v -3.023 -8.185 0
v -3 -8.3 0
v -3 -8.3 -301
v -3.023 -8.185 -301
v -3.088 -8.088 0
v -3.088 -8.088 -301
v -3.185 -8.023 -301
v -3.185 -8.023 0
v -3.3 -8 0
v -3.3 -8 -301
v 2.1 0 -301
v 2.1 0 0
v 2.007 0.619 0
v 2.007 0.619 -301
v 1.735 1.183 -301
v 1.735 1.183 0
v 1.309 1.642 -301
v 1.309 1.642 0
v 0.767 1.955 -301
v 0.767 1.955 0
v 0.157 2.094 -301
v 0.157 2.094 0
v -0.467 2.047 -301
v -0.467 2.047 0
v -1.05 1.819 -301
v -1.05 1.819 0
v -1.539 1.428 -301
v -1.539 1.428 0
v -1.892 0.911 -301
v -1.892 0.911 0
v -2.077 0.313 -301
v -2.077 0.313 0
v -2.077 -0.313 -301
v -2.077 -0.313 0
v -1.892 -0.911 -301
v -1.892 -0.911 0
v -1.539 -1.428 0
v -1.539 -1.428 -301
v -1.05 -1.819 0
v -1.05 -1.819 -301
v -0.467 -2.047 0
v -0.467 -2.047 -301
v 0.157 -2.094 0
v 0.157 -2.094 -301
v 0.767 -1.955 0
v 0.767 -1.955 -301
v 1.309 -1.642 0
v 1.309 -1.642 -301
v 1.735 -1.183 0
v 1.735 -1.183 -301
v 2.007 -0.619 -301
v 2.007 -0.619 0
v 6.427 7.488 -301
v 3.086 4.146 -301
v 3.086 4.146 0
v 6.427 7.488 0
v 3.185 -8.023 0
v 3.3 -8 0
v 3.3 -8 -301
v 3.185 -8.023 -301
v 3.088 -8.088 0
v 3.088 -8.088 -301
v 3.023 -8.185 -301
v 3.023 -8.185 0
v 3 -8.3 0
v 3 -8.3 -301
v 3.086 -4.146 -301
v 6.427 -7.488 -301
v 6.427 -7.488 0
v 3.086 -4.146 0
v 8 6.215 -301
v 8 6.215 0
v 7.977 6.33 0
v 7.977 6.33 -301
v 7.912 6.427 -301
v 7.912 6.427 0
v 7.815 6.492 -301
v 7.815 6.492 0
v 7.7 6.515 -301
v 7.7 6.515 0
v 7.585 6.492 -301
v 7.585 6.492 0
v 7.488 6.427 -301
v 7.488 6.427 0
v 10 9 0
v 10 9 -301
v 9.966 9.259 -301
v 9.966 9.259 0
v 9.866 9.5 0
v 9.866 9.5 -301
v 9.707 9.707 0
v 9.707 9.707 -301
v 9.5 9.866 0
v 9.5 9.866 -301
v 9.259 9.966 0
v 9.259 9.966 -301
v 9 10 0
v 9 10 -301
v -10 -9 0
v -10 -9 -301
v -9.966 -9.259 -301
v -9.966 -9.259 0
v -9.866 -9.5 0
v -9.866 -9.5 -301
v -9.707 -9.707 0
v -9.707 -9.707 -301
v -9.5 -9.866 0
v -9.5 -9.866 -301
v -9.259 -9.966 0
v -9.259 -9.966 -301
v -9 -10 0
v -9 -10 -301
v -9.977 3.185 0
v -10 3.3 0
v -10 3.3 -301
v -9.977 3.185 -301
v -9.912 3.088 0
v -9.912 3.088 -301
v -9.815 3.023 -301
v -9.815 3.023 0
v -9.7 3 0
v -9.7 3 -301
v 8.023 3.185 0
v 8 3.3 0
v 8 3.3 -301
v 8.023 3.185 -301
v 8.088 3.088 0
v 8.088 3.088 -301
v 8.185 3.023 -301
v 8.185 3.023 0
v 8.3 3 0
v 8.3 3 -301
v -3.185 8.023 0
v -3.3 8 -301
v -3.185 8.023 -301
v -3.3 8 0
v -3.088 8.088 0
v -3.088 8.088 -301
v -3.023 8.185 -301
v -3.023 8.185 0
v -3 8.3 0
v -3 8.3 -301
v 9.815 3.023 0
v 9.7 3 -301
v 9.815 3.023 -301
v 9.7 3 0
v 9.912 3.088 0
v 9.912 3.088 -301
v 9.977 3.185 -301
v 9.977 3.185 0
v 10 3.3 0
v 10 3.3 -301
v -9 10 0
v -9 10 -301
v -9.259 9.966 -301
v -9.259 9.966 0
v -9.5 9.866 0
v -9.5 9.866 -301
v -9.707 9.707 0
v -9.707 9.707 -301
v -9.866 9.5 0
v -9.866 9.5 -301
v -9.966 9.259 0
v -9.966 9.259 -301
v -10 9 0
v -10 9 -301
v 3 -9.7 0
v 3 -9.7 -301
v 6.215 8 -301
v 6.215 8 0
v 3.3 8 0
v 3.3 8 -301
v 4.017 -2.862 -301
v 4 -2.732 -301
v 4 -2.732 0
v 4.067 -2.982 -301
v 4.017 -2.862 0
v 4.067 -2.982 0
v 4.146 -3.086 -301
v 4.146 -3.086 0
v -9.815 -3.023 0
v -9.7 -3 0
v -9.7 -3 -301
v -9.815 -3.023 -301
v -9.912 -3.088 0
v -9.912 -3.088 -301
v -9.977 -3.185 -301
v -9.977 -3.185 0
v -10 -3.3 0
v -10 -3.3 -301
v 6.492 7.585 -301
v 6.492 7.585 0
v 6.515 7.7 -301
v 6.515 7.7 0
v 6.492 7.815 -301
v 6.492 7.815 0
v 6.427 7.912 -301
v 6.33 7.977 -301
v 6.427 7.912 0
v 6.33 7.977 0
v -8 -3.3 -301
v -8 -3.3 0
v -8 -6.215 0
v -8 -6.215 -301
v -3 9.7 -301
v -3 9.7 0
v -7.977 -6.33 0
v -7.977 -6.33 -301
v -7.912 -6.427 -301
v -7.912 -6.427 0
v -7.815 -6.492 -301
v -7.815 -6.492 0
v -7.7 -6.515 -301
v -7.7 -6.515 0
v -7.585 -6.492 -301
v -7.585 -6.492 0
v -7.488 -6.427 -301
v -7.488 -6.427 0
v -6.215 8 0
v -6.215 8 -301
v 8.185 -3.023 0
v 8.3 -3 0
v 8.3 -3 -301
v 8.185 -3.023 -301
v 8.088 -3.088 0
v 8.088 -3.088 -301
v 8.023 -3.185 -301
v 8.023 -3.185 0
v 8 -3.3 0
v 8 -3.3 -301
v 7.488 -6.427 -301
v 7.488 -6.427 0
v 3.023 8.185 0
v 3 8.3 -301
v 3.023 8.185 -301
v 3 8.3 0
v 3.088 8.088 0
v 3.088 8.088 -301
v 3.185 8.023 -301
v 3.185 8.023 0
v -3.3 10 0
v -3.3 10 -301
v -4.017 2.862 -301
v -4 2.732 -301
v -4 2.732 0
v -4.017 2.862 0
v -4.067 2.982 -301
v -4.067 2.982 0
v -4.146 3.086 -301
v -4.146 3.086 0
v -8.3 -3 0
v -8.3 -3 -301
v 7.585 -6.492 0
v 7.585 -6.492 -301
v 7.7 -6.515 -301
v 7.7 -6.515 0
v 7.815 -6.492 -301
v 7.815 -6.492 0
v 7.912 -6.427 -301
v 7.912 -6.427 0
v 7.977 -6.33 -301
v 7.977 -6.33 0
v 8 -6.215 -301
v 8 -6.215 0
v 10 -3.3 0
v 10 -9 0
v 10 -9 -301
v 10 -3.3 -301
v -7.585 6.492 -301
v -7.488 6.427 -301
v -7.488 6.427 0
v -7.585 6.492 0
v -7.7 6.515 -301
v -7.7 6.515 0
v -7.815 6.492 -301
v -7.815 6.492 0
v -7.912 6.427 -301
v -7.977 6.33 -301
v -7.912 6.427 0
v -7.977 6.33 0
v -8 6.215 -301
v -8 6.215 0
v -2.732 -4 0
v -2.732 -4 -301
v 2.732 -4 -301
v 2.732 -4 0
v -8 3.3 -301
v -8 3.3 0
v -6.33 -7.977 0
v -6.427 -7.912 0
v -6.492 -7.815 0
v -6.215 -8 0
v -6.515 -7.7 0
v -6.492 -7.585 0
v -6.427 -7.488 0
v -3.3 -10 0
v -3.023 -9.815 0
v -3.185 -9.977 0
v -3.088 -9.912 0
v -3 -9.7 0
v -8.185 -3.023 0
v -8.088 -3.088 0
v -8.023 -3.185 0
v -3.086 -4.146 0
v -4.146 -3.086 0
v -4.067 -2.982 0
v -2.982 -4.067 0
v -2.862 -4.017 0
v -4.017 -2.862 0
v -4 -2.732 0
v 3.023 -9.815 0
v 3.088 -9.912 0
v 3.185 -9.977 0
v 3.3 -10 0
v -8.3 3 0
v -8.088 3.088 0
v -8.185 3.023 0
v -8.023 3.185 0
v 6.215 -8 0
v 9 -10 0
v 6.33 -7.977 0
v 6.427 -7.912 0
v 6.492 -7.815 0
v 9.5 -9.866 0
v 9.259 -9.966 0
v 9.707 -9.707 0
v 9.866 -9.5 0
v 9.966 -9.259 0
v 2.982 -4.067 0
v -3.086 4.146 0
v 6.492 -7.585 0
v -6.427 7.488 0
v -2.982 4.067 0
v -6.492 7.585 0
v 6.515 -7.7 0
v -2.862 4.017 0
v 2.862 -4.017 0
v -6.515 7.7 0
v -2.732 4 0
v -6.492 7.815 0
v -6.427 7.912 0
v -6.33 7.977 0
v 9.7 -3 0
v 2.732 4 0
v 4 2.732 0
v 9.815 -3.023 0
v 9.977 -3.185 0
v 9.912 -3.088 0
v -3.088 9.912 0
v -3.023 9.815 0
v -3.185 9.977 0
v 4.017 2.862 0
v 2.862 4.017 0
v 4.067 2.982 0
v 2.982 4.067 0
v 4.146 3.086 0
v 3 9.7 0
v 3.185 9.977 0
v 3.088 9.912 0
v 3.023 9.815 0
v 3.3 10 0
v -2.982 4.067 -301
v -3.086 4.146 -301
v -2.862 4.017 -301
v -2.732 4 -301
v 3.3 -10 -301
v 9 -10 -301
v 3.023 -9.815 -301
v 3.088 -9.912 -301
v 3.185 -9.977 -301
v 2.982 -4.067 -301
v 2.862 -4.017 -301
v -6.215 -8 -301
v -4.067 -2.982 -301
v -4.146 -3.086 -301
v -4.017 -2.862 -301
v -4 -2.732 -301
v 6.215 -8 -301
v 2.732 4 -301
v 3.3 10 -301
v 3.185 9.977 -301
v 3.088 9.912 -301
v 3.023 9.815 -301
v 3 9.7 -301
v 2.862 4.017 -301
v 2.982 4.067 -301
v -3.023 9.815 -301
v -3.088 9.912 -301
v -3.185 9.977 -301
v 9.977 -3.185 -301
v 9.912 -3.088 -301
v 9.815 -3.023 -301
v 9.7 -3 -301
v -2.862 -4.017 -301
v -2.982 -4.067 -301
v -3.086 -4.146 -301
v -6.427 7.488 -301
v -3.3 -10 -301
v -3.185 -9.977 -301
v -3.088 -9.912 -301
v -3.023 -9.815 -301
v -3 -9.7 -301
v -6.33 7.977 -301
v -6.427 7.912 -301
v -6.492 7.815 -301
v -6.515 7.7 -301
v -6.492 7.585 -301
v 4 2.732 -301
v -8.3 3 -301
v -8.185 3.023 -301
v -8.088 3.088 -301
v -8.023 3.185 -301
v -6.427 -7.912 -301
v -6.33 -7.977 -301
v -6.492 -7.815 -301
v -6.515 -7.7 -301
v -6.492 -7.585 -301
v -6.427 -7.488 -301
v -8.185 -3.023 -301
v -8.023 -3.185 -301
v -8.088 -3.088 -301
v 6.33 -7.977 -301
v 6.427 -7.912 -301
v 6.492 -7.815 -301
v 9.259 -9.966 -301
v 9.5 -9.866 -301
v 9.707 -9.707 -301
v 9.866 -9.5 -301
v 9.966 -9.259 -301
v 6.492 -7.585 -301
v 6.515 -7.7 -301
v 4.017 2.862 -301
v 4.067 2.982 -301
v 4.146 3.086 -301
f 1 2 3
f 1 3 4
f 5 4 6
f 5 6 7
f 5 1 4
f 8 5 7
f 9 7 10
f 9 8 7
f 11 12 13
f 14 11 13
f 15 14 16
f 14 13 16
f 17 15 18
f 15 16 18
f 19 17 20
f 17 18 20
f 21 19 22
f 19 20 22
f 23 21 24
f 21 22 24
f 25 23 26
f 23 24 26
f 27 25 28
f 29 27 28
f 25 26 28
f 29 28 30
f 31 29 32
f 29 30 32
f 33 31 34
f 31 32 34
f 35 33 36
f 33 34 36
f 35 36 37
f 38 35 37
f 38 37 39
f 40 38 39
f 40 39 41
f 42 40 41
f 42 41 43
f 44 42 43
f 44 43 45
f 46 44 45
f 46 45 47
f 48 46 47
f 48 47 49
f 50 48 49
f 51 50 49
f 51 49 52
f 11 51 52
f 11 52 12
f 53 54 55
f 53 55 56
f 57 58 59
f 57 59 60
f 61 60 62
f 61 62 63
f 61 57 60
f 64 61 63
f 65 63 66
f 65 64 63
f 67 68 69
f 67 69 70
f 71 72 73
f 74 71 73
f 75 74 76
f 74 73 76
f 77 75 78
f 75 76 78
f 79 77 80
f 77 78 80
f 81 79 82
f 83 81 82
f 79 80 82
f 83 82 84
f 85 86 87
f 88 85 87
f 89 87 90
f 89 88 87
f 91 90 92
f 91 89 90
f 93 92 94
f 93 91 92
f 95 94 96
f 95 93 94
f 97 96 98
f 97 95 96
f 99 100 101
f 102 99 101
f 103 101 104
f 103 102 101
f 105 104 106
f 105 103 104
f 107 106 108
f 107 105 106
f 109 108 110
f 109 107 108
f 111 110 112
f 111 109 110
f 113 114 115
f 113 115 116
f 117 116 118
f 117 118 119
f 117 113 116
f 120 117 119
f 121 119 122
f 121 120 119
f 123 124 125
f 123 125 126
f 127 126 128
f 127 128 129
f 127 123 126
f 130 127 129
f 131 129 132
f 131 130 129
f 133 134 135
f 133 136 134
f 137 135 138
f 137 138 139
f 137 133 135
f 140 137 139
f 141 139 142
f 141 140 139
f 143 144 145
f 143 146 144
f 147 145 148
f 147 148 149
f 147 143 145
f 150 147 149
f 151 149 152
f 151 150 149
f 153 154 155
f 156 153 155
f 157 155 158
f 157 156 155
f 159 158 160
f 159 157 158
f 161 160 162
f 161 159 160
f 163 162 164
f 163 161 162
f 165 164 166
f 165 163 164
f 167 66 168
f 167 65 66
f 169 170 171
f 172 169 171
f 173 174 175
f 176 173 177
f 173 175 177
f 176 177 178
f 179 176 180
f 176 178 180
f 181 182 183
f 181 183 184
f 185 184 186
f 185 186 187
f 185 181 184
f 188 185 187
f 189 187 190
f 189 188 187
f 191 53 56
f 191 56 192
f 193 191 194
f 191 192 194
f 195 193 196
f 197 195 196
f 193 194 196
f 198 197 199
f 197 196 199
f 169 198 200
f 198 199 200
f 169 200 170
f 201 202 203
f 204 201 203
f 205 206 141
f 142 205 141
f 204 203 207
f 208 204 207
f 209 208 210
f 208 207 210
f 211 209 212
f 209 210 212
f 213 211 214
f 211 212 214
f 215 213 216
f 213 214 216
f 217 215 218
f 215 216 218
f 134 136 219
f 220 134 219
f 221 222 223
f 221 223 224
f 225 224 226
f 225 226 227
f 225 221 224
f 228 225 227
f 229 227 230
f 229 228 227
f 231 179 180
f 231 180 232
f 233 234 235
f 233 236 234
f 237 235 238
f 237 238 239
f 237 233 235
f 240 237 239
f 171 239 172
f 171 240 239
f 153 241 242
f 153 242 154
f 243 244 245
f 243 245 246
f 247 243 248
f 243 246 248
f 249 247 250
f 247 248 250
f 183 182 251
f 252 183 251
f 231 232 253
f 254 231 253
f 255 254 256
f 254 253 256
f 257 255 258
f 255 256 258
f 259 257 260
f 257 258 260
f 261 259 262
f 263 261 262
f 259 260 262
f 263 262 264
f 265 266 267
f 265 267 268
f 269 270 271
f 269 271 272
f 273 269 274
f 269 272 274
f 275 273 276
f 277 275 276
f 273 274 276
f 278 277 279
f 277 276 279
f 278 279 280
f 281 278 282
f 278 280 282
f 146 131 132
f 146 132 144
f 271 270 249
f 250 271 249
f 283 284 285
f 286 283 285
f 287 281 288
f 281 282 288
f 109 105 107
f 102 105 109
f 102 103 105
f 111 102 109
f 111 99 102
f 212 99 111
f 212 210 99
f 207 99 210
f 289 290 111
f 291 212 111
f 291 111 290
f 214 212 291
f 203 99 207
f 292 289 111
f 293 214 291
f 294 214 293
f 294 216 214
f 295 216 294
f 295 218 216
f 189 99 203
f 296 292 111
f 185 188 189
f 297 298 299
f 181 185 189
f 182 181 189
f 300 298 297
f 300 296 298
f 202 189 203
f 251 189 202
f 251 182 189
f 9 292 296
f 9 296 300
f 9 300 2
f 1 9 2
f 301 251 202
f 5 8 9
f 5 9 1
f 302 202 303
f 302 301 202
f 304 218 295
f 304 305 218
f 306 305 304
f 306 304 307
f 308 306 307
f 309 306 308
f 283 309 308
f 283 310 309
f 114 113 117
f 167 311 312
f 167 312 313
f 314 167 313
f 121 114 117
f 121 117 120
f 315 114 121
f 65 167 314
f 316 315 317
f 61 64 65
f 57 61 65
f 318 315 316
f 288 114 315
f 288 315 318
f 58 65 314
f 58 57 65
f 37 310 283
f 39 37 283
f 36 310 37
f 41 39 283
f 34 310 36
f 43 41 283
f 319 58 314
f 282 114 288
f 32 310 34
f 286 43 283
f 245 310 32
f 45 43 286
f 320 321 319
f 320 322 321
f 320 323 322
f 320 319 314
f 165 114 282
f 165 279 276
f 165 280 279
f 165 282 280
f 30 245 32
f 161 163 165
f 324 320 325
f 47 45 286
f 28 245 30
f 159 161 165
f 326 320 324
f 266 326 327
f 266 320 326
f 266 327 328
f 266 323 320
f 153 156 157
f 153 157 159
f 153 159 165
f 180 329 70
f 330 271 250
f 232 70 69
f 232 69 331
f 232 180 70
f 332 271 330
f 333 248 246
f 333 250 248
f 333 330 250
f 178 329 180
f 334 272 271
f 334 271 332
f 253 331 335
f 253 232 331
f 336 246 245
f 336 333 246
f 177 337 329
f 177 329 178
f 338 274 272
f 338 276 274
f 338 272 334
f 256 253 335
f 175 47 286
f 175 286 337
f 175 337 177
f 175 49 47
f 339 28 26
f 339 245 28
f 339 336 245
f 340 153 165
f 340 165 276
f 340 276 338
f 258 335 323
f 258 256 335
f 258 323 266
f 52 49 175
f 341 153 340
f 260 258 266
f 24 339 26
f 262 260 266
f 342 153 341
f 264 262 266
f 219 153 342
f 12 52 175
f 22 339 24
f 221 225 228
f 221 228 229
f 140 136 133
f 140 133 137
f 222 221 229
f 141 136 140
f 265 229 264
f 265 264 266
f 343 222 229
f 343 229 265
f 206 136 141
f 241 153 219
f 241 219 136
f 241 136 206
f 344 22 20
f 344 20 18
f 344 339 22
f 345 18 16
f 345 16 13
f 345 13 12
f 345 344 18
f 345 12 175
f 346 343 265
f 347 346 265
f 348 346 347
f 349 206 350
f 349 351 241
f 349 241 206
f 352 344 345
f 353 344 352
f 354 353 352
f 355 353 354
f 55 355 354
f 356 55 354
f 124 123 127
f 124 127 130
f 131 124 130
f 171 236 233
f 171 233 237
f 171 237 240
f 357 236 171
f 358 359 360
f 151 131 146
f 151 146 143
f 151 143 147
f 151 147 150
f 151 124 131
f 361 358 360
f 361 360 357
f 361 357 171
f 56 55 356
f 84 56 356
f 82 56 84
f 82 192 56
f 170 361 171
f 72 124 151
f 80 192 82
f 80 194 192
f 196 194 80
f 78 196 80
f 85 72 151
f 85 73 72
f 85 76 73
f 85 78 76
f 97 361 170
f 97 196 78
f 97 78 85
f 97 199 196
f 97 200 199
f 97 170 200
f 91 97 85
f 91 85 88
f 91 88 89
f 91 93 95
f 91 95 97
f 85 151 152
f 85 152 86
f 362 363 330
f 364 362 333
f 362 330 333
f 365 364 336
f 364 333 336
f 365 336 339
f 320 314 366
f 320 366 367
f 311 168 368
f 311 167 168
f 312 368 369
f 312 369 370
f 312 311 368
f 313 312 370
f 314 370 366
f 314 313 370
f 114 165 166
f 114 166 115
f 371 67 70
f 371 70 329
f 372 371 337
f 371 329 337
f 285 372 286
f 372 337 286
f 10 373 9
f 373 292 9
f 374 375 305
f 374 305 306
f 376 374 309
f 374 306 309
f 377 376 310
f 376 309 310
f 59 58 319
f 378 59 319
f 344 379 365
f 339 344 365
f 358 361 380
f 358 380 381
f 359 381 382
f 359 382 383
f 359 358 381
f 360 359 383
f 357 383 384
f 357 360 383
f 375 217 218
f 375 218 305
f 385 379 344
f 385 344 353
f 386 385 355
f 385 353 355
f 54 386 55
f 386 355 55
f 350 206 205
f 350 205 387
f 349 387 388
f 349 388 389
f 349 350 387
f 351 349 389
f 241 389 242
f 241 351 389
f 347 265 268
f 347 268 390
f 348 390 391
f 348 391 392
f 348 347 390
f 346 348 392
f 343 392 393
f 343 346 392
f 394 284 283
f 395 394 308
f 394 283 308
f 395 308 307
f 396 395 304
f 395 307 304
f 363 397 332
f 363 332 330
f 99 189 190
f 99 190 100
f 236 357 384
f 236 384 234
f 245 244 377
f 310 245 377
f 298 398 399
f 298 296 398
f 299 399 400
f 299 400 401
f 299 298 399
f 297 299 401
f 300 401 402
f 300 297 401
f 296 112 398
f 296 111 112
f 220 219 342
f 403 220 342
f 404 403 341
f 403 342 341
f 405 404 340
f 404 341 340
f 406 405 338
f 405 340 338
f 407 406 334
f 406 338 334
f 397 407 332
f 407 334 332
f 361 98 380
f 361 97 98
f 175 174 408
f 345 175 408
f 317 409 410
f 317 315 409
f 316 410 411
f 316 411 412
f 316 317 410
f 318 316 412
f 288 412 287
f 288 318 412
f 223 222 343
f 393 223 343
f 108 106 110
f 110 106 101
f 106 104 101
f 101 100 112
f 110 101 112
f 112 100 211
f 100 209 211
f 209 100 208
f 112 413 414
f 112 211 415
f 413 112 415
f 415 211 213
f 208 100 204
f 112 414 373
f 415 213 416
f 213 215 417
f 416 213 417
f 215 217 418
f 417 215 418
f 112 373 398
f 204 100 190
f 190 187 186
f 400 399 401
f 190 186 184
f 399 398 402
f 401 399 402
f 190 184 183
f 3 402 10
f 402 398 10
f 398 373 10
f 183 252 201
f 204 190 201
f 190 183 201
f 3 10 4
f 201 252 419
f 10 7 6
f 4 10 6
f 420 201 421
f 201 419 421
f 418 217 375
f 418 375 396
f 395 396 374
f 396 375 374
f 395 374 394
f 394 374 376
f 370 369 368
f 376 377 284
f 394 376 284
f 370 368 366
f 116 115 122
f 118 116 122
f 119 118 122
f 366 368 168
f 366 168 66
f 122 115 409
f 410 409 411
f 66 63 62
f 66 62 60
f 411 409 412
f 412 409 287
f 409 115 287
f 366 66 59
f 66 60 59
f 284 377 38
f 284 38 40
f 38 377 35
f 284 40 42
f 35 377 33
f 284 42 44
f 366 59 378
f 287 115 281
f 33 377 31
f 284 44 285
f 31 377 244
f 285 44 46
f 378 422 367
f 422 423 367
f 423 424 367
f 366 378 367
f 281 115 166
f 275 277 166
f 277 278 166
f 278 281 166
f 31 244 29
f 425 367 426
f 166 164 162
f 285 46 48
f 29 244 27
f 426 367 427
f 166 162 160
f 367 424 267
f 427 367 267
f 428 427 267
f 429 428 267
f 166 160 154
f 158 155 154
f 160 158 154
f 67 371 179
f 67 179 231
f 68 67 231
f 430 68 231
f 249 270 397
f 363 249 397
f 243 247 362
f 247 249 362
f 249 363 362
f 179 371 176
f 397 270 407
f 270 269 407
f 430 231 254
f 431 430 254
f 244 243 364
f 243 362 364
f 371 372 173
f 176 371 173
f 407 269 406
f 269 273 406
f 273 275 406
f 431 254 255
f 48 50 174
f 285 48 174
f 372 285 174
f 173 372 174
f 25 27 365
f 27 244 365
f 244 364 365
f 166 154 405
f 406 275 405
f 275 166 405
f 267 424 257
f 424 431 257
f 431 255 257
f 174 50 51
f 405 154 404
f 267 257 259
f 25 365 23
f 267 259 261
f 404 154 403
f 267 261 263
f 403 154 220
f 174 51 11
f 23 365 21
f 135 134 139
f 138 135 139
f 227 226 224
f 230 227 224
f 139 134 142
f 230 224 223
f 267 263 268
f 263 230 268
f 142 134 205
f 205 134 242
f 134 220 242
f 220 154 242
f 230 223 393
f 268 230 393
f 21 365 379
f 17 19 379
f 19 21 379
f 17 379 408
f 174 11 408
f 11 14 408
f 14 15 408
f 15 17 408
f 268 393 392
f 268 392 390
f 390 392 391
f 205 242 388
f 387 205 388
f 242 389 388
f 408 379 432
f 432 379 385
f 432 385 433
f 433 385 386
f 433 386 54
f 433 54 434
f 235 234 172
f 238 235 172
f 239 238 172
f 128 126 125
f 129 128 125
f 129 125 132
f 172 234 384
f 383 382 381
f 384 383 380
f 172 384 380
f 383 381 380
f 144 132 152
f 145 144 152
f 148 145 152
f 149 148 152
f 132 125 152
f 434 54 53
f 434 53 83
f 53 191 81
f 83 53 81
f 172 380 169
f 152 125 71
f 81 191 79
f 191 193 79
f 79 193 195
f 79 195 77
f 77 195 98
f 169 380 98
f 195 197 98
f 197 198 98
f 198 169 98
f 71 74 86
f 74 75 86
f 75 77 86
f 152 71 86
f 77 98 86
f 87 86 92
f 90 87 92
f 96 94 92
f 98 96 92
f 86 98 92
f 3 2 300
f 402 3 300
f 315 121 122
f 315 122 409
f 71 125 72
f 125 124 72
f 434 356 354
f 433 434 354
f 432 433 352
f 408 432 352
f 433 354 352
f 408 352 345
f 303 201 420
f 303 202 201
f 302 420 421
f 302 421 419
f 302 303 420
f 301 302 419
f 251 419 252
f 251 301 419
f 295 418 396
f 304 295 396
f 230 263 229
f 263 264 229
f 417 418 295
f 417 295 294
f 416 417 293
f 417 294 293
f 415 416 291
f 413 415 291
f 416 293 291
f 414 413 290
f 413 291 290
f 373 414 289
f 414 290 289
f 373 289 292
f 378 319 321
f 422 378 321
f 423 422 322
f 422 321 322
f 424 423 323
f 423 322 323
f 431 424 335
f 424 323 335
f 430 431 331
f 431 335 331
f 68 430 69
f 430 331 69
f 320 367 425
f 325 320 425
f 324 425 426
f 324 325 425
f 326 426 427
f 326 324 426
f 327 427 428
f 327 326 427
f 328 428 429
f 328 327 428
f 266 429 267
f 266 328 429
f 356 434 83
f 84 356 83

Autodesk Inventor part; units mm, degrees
ref_plane "YZ Plane" through (0, 0, 0) normal (1, 0, 0) x (0, 1, 0)
ref_plane "XZ Plane" through (0, 0, 0) normal (0, 1, 0) x (-1, 0, 0)
ref_plane "XY Plane" through (0, 0, 0) normal (0, 0, 1) x (1, 0, 0)
sketch "Skizze1" plane through (0, 0, 0) normal (0, 0, 1) x (1, 0, 0)
  line L0 (-20.0059, 0) -> (20.0059, 0) projected
  line L1 (0, -20.0059) -> (0, 20.0059) projected
  line L2 (-14.2899, 0) -> (14.2899, 0)
  line L3 (0, -14.2899) -> (0, 14.2899)
  line L4 (-10, -10) -> (10, 10) construction
  line L5 (10, -10) -> (-10, 10) construction
  line L6 (-8, -8) -> (8, 8) construction
  line L7 (8, -8) -> (-8, 8) construction
  line L8 (-2.7322, -4) -> (2.7322, -4)
  line L9 (4, -2.7322) -> (4, 2.7322)
  line L10 (2.7322, 4) -> (-2.7322, 4)
  line L11 (-4, 2.7322) -> (-4, -2.7322)
  line L12 (-4, -4) -> (4, 4) construction
  line L13 (4, -4) -> (-4, 4) construction
  arc A0 (-9, 10) -> (-10, 9) centre (-9, 9) ccw
  arc A1 (10, 9) -> (9, 10) centre (9, 9) ccw
  arc A2 (9, -10) -> (10, -9) centre (9, -9) ccw
  arc A3 (-10, -9) -> (-9, -10) centre (-9, -9) ccw
  line L14 (-3, 9.7) -> (-3, 8.3)
  line L15 (3, 9.7) -> (3, 8.3)
  line L16 (6.2151, 8) -> (3.3, 8)
  line L17 (-3.3, 8) -> (-6.2151, 8)
  line L18 (9, 10) -> (3.3, 10)
  line L19 (-3.3, 10) -> (-9, 10)
  line L20 (-9.7, -3) -> (-8.3, -3)
  line L21 (-9.7, 3) -> (-8.3, 3)
  line L22 (-8, 6.2151) -> (-8, 3.3)
  line L23 (-8, -3.3) -> (-8, -6.2151)
  line L24 (-10, 9) -> (-10, 3.3)
  line L25 (-10, -3.3) -> (-10, -9)
  line L26 (-3, -8.3) -> (-3, -9.7)
  line L27 (3, -8.3) -> (3, -9.7)
  line L28 (-9, -10) -> (-3.3, -10)
  line L29 (3.3, -10) -> (9, -10)
  line L30 (-6.2151, -8) -> (-3.3, -8)
  line L31 (3.3, -8) -> (6.2151, -8)
  line L32 (8.3, 3) -> (9.7, 3)
  line L33 (8.3, -3) -> (9.7, -3)
  line L34 (8, -6.2151) -> (8, -3.3)
  line L35 (8, 3.3) -> (8, 6.2151)
  line L36 (10, -9) -> (10, -3.3)
  line L37 (10, 3.3) -> (10, 9)
  arc A4 (-10, 3.3) -> (-9.7, 3) centre (-9.7, 3.3) ccw
  arc A5 (-8.3, 3) -> (-8, 3.3) centre (-8.3, 3.3) ccw
  arc A6 (-9.7, -3) -> (-10, -3.3) centre (-9.7, -3.3) ccw
  arc A7 (-8, -3.3) -> (-8.3, -3) centre (-8.3, -3.3) ccw
  arc A8 (-3.3, -10) -> (-3, -9.7) centre (-3.3, -9.7) ccw
  arc A9 (-3, -8.3) -> (-3.3, -8) centre (-3.3, -8.3) ccw
  arc A10 (3, -9.7) -> (3.3, -10) centre (3.3, -9.7) ccw
  arc A11 (3.3, -8) -> (3, -8.3) centre (3.3, -8.3) ccw
  arc A12 (8.3, -3) -> (8, -3.3) centre (8.3, -3.3) ccw
  arc A13 (10, -3.3) -> (9.7, -3) centre (9.7, -3.3) ccw
  arc A14 (8, 3.3) -> (8.3, 3) centre (8.3, 3.3) ccw
  arc A15 (9.7, 3) -> (10, 3.3) centre (9.7, 3.3) ccw
  arc A16 (3, 8.3) -> (3.3, 8) centre (3.3, 8.3) ccw
  arc A17 (3.3, 10) -> (3, 9.7) centre (3.3, 9.7) ccw
  arc A18 (-3.3, 8) -> (-3, 8.3) centre (-3.3, 8.3) ccw
  arc A19 (-3, 9.7) -> (-3.3, 10) centre (-3.3, 9.7) ccw
  line L38 (-7.4879, 6.4272) -> (-4.1464, 3.0858)
  line L39 (-6.4272, 7.4879) -> (-3.0858, 4.1464)
  line L40 (-6.4272, -7.4879) -> (-3.0858, -4.1464)
  line L41 (-7.4879, -6.4272) -> (-4.1464, -3.0858)
  arc A20 (-7.4879, 6.4272) -> (-8, 6.2151) centre (-7.7, 6.2151) ccw
  arc A21 (-6.2151, 8) -> (-6.4272, 7.4879) centre (-6.2151, 7.7) ccw
  arc A22 (-8, -6.2151) -> (-7.4879, -6.4272) centre (-7.7, -6.2151) ccw
  arc A23 (-6.4272, -7.4879) -> (-6.2151, -8) centre (-6.2151, -7.7) ccw
  line L42 (6.4272, -7.4879) -> (3.0858, -4.1464)
  line L43 (4.1464, -3.0858) -> (7.4879, -6.4272)
  arc A24 (6.2151, -8) -> (6.4272, -7.4879) centre (6.2151, -7.7) ccw
  arc A25 (7.4879, -6.4272) -> (8, -6.2151) centre (7.7, -6.2151) ccw
  line L44 (4.1464, 3.0858) -> (7.4879, 6.4272)
  line L45 (3.0858, 4.1464) -> (6.4272, 7.4879)
  arc A26 (6.4272, 7.4879) -> (6.2151, 8) centre (6.2151, 7.7) ccw
  arc A27 (8, 6.2151) -> (7.4879, 6.4272) centre (7.7, 6.2151) ccw
  arc A28 (-3.0858, 4.1464) -> (-2.7322, 4) centre (-2.7322, 4.5) ccw
  arc A29 (-4, 2.7322) -> (-4.1464, 3.0858) centre (-4.5, 2.7322) ccw
  arc A30 (2.7322, 4) -> (3.0858, 4.1464) centre (2.7322, 4.5) ccw
  arc A31 (4.1464, 3.0858) -> (4, 2.7322) centre (4.5, 2.7322) ccw
  arc A32 (-4.1464, -3.0858) -> (-4, -2.7322) centre (-4.5, -2.7322) ccw
  arc A33 (-2.7322, -4) -> (-3.0858, -4.1464) centre (-2.7322, -4.5) ccw
  arc A34 (3.0858, -4.1464) -> (2.7322, -4) centre (2.7322, -4.5) ccw
  arc A35 (4, -2.7322) -> (4.1464, -3.0858) centre (4.5, -2.7322) ccw
  circle A36 centre (0, 0) radius 2.1
  point P0 (3, 8.9014)
  point P1 (-3, 9.1415)
  point P2 (-8.9764, -3)
  point P3 (-9.1265, 3)
  point P4 (3, -9.1251)
  point P5 (-3, -9.1251)
  point P6 (9.1101, -3)
  point P7 (9.1101, 3)
  dimension "d0" = 20
  dimension "d1" = 20
  dimension "d2" = 16
  dimension "d3" = 16
  dimension "d4" = 8
  dimension "d5" = 8
  dimension "d6" = 1
  dimension "d7" = 6
  dimension "d8" = 6
  dimension "d9" = 6
  dimension "d10" = 6
  dimension "d11" = 0.3
  dimension "d12" = 1.5
  dimension "d13" = 1.5
  dimension "d14" = 0.3
  dimension "d15" = 1.5
  dimension "d16" = 0.3
  dimension "d17" = 1.5
  dimension "d18" = 0.3
  dimension "d19" = 0.5
  dimension "d20" = 4.2
  dimension "d21" = 45
  dimension "d22" = 10
  dimension "d23" = 10
  dimension "d24" = 4
  dimension "d25" = 4
  dimension "d26" = 10
  dimension "d27" = 8
  dimension "d28" = 4
  dimension "d29" = 4
  dimension "d30" = 10
  dimension "d31" = 9.1101
  dimension "d32" = 8
  dimension "d33" = 4
  dimension "d34" = 8.9014
  dimension "d35" = 9.1251
  dimension "d36" = 9.1415
  dimension "d37" = 8.9764
  dimension "d38" = 9.1265
extrude "Extrusion1" add sketch "Skizze1" against normal blind 301 contours L11 A29 L38 A20 L22 A5 L21 A4 L24 A0 L19 A19 L14 A18 L17 A21 L39 A28 L10 L1 A36 L0 | L0 A36 L1 L8 A33 L40 A23 L30 A9 L26 A8 L28 A3 L25 A6 L20 A7 L23 A22 L41 A32 L11 | L1 L10 A30 L45 A26 L16 A16 L15 A17 L18 A1 L37 A15 L32 A14 L35 A27 L44 A31 L9 L0 A36 | A36 L0 L9 A35 L43 A25 L34 A12 L33 A13 L36 A2 L29 A10 L27 A11 L31 A24 L42 A34 L8 L1
properties part number "I Strebe Motorhalterung senkrecht" material "Aluminium 6061"
